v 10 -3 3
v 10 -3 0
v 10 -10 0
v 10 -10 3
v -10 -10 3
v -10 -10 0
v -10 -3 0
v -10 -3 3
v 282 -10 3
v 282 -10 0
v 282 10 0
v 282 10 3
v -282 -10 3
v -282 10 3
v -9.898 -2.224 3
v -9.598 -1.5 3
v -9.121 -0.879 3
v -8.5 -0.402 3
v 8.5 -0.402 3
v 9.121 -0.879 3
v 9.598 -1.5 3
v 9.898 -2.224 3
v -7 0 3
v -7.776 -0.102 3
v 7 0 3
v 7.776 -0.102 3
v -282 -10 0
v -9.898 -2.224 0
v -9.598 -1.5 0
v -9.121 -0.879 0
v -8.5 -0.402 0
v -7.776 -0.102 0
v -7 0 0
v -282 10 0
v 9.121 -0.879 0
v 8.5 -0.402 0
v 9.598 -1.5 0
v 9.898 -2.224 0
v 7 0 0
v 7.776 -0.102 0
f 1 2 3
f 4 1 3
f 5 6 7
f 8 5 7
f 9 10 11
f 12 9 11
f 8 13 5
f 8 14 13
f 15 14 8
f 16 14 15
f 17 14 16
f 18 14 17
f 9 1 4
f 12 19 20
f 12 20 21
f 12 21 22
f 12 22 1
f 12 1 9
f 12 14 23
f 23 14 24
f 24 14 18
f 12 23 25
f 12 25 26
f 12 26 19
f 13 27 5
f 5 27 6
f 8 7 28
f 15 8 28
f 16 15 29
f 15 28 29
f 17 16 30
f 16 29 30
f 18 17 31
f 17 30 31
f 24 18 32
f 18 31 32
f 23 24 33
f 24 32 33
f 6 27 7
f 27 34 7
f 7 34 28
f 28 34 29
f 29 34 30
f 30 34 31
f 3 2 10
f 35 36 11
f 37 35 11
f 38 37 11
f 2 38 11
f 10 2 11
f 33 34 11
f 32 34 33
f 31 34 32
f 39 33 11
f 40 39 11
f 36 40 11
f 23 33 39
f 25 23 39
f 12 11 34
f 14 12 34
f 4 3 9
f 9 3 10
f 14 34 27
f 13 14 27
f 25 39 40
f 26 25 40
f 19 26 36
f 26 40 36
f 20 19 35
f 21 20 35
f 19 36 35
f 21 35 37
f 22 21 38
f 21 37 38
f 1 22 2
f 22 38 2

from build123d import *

# Parameters (mm, degrees)
EXTRUDE_1_DEPTH = 3


with BuildPart() as part:
    # 草圖1 → 填料-伸長1 (new body)
    with BuildSketch(Plane.XY):
        with BuildLine():
            Line((-282, -10), (-10, -10))
            Line((-10, -10), (-10, -3))
            ThreePointArc((-10, -3), (-9.121320344, -0.878679656), (-7, 0))
            Line((-7, 0), (7, 0))
            ThreePointArc((7, 0), (9.121320344, -0.878679656), (10, -3))
            Line((10, -3), (10, -10))
            Line((10, -10), (282, -10))
            Line((282, -10), (282, 10))
            Line((282, 10), (-282, 10))
            Line((-282, 10), (-282, -10))
        make_face()
    extrude(amount=EXTRUDE_1_DEPTH)


solid = part.part
